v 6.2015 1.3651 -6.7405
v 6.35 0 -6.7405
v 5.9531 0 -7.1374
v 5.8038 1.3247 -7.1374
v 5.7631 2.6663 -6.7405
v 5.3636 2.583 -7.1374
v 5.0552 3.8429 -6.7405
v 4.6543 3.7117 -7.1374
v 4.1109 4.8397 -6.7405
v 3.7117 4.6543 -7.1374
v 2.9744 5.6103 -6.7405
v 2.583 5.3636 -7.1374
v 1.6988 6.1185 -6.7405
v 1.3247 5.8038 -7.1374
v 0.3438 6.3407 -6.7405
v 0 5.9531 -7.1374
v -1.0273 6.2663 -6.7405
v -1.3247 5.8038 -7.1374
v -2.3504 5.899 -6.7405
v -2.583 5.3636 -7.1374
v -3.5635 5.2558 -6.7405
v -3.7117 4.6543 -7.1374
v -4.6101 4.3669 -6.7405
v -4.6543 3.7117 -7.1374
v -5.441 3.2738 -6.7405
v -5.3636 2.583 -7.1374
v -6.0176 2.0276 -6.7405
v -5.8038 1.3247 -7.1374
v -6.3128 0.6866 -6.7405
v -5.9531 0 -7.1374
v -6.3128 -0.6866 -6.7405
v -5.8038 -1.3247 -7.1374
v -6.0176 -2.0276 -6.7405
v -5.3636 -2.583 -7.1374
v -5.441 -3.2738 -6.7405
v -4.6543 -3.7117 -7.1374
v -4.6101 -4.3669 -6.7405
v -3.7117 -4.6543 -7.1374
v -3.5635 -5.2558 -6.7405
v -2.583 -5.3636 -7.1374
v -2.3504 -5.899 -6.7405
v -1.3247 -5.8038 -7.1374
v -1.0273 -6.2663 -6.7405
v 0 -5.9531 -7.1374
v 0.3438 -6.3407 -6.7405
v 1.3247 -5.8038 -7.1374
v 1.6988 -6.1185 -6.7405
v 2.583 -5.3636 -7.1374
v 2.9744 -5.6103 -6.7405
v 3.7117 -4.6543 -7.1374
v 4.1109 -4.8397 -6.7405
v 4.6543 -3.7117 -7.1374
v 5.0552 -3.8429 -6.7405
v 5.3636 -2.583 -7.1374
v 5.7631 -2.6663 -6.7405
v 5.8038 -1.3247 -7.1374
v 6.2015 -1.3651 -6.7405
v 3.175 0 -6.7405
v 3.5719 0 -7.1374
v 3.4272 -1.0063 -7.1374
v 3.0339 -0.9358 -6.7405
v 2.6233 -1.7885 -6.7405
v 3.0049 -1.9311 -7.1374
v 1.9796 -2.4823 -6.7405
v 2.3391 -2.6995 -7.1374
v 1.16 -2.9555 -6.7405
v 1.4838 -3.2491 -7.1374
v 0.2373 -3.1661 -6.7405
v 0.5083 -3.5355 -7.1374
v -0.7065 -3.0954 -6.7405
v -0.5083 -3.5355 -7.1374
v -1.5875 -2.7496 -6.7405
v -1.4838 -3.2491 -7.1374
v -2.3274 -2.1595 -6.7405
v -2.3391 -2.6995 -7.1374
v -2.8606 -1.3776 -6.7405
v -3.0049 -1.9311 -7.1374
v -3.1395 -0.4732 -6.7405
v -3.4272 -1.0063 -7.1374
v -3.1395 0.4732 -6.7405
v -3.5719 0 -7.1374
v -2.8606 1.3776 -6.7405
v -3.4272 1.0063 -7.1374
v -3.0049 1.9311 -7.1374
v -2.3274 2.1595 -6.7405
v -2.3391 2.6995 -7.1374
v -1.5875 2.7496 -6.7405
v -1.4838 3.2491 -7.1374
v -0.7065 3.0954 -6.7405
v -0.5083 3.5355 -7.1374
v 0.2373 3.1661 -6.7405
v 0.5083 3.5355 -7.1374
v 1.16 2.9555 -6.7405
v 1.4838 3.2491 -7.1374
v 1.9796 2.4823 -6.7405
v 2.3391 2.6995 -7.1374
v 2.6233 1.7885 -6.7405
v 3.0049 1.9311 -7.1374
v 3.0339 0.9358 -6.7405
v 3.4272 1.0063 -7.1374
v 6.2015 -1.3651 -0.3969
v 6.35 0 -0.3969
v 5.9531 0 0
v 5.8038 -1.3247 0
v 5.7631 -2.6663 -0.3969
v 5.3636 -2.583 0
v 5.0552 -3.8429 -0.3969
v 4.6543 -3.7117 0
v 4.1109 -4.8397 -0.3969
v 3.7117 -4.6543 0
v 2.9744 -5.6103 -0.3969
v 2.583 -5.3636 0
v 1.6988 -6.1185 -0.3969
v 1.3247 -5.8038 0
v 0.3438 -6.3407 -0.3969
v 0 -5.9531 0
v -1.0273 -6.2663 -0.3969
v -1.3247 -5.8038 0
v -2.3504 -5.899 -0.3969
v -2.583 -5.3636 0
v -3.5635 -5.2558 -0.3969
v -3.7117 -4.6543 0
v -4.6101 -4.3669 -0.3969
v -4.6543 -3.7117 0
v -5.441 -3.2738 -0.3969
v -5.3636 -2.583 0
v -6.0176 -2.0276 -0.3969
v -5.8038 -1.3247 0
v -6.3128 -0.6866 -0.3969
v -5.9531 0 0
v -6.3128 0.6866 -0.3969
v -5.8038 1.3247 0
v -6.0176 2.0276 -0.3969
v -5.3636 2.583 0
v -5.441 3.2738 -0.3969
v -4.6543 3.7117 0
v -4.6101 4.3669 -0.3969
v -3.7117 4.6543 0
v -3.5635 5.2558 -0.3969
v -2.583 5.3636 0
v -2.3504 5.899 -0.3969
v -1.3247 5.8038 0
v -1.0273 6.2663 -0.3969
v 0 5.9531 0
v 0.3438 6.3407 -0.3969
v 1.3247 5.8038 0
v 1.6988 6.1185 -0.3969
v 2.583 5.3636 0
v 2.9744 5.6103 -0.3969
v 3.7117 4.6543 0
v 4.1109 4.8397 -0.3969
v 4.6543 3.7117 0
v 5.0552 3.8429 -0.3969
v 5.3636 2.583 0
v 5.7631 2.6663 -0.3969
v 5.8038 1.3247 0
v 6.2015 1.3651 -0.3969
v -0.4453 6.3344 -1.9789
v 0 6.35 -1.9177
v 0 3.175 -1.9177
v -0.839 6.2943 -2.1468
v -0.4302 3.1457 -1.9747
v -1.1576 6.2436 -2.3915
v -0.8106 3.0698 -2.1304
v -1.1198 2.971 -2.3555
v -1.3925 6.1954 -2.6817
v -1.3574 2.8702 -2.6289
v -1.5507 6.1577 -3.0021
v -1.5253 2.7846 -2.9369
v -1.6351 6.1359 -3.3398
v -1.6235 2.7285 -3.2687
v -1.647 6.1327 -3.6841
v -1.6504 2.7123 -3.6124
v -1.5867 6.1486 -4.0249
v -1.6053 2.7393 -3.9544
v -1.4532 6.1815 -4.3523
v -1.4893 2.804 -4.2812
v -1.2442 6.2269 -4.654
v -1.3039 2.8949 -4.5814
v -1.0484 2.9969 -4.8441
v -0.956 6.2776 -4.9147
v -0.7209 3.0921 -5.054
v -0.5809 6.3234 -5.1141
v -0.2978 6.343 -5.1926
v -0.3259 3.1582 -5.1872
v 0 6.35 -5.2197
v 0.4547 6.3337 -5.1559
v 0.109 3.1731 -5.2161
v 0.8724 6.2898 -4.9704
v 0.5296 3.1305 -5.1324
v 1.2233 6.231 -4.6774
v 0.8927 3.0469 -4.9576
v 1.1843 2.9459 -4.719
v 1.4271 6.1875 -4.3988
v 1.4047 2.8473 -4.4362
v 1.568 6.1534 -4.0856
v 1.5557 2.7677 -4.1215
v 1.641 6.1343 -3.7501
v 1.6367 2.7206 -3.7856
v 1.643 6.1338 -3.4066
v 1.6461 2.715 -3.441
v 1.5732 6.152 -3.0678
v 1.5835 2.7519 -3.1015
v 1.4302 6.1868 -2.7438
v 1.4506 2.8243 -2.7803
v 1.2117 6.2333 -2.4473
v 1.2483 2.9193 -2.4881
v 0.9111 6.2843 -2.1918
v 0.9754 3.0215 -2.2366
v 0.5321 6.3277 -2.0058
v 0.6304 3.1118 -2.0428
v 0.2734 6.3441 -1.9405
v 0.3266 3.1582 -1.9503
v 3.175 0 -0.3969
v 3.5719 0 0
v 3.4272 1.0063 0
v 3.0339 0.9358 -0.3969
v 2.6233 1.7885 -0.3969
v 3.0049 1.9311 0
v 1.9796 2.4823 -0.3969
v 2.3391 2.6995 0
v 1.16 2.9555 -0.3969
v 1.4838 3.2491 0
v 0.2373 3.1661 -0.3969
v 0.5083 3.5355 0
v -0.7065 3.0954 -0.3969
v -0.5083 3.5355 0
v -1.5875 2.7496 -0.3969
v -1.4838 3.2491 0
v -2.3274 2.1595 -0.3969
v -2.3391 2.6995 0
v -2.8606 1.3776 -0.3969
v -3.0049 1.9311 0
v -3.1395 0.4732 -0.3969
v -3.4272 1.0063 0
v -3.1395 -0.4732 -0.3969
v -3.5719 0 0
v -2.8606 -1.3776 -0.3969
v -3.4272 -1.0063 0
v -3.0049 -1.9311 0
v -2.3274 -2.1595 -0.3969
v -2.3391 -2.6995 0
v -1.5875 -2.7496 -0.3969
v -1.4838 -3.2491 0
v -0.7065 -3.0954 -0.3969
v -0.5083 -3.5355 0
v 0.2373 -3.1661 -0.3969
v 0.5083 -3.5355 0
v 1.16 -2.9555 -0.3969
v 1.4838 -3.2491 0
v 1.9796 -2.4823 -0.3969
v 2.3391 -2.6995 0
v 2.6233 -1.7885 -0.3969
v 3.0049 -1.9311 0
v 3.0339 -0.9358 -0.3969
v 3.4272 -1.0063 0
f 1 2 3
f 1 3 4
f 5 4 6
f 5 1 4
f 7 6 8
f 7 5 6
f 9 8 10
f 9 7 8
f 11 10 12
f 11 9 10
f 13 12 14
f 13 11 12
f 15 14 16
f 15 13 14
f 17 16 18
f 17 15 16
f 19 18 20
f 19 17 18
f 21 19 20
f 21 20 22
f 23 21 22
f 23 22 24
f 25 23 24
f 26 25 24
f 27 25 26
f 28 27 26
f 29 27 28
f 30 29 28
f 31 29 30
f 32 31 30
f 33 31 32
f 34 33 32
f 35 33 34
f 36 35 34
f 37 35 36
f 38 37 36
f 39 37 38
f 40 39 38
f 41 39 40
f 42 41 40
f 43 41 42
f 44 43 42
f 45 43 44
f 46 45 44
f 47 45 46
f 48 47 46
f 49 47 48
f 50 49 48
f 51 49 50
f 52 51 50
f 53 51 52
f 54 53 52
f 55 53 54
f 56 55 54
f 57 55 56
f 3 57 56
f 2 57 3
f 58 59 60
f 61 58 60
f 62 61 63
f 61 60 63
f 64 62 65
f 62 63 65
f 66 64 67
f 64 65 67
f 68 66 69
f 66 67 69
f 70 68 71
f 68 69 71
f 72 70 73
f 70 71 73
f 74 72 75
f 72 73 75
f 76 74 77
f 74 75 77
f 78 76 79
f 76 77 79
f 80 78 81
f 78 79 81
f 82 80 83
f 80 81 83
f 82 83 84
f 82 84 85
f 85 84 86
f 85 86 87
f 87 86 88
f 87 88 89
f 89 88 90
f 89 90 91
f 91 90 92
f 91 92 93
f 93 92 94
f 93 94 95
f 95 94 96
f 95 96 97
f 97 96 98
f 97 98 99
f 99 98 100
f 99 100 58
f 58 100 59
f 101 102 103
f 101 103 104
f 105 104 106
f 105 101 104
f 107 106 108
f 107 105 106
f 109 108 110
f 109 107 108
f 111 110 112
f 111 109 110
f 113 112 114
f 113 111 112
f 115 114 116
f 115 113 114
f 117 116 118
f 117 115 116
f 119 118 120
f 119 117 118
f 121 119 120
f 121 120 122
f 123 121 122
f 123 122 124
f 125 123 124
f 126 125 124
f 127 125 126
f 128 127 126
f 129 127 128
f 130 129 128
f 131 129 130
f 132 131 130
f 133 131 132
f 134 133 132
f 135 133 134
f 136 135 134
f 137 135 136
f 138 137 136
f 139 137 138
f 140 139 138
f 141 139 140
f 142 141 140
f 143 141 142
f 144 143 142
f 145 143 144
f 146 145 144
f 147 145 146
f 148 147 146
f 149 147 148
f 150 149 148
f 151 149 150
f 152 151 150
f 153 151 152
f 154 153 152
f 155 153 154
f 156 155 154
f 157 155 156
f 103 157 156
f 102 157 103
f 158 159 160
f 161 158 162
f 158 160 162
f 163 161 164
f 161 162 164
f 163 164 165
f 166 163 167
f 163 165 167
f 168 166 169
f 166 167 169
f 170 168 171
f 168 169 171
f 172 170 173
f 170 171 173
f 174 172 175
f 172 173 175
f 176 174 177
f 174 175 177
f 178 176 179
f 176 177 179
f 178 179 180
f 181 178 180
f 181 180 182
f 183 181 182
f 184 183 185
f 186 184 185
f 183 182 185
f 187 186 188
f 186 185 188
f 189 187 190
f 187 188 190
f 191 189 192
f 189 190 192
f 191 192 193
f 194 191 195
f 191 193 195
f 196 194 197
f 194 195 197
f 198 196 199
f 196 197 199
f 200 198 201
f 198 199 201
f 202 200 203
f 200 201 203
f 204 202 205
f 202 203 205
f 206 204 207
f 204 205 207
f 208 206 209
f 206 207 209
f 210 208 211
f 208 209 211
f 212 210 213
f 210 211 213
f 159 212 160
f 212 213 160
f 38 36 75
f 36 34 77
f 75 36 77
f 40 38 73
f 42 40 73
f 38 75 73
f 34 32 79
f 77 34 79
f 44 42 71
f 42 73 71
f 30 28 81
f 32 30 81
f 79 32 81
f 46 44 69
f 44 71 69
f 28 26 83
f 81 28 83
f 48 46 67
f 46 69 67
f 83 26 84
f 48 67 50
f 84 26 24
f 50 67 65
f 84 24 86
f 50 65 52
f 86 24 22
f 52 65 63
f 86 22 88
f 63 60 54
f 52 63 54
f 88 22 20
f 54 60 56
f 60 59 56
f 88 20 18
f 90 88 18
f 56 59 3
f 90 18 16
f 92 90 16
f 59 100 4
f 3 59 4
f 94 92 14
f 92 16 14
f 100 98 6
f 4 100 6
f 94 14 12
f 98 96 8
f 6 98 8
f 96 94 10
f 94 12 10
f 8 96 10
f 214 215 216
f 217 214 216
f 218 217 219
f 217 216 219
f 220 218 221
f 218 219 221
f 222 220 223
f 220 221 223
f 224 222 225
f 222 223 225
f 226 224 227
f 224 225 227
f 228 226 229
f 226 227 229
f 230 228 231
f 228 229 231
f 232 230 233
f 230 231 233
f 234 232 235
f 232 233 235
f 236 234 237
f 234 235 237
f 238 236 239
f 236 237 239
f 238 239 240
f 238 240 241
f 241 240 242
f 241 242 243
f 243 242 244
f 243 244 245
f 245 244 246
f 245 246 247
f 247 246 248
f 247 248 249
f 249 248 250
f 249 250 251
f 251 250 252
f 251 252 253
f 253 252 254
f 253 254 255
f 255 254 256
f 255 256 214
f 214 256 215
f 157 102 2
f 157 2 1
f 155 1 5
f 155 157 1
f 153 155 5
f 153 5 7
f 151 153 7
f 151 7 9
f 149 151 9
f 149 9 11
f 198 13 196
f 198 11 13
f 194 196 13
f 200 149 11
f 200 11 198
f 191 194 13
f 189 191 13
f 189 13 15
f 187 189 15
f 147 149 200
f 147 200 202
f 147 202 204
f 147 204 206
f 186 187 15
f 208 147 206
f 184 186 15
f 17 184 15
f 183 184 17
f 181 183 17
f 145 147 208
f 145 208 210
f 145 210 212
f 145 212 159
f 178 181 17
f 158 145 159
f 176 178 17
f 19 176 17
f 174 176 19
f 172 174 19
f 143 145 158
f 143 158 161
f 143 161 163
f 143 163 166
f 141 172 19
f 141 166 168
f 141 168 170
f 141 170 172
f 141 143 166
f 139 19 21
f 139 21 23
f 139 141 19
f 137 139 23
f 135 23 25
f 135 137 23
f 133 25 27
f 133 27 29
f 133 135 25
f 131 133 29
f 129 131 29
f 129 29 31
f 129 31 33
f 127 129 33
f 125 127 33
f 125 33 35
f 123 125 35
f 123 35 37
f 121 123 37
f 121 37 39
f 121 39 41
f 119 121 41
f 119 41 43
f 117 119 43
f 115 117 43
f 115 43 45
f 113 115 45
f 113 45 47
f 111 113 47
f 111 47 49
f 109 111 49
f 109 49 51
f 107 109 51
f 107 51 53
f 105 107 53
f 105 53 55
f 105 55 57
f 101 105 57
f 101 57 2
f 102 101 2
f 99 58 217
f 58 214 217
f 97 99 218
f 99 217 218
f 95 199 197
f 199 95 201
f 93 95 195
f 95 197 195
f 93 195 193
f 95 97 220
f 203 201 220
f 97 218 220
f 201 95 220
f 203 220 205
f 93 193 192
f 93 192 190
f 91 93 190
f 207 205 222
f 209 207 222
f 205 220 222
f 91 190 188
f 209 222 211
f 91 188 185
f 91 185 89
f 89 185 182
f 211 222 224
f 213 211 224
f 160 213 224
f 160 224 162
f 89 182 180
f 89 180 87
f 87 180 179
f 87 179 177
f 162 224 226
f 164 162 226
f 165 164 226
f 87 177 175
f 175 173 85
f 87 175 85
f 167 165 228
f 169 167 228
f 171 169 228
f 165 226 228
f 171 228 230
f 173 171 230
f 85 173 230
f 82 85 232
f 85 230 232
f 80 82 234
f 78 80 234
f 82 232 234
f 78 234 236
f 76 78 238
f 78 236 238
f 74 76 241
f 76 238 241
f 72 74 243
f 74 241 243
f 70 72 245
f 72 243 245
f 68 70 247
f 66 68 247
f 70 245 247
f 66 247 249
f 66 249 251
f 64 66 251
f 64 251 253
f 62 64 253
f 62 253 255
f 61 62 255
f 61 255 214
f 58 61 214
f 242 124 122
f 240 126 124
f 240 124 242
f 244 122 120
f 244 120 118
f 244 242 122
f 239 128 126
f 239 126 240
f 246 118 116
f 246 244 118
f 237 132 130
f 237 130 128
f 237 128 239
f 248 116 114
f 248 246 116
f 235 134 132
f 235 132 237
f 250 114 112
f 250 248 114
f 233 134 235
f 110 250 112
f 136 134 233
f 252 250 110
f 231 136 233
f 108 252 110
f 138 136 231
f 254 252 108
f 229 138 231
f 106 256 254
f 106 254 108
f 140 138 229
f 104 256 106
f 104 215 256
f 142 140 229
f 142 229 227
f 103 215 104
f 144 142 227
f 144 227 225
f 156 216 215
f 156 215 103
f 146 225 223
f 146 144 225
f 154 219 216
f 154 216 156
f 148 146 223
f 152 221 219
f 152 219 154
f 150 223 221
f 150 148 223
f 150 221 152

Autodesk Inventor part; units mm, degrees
ref_plane "YZ Plane" through (0, 0, 0) normal (1, 0, 0) x (0, 1, 0)
ref_plane "XY Plane" through (0, 0, 0) normal (0, 0, 1) x (1, 0, 0)
sketch "Sketch1" plane through (0, 0, 0) normal (0, 0, 1) x (1, 0, 0)
  circle A0 centre (0, 0) radius 6.35
  dimension "d0" = 12.7
extrude "Extrusion1" add sketch "Sketch1" against normal blind 7.1374
sketch "Sketch2" plane through (0, 0, 0) normal (0, 0, 1) x (1, 0, 0)
  circle A0 centre (0, 0) radius 6.35 projected
  circle A1 centre (0, 0) radius 3.175
  dimension "d3" = 6.35
extrude "Extrusion2" cut sketch "Sketch2" against normal up to next contours A1
chamfer "Chamfer1" distance 0.3969 angle 45 4 edges at (-6.35, 0, 0) (-6.35, 0, -7.1374) (-3.175, 0, 0) (-3.175, 0, -7.1374)
ref_plane "Work Plane1" through (0, 6.35, 0) normal (0, 1, 0) x (-1, 0, 0)
sketch "Sketch3" plane through (0, 6.35, 0) normal (0, 1, 0) x (-1, 0, 0)
  line L0 (5.9531, -7.1374) -> (-5.9531, -7.1374) projected
  line L1 (6.35, -0.3969) -> (6.35, -6.7405) projected
  point P0 (0, 0)
  point P1 (0, -3.5687)
hole "Hole1" at (0, 6.35, -3.5687) direction (0, -1, 0) diameter 3.302 end up to surface thread size "8-32 UNC" class "2B" standard "ANSI Unified Screw Threads"
properties part number "Misc_ShaftCollar_Ruland_SC-4-F" material "Steel, Carbon"
